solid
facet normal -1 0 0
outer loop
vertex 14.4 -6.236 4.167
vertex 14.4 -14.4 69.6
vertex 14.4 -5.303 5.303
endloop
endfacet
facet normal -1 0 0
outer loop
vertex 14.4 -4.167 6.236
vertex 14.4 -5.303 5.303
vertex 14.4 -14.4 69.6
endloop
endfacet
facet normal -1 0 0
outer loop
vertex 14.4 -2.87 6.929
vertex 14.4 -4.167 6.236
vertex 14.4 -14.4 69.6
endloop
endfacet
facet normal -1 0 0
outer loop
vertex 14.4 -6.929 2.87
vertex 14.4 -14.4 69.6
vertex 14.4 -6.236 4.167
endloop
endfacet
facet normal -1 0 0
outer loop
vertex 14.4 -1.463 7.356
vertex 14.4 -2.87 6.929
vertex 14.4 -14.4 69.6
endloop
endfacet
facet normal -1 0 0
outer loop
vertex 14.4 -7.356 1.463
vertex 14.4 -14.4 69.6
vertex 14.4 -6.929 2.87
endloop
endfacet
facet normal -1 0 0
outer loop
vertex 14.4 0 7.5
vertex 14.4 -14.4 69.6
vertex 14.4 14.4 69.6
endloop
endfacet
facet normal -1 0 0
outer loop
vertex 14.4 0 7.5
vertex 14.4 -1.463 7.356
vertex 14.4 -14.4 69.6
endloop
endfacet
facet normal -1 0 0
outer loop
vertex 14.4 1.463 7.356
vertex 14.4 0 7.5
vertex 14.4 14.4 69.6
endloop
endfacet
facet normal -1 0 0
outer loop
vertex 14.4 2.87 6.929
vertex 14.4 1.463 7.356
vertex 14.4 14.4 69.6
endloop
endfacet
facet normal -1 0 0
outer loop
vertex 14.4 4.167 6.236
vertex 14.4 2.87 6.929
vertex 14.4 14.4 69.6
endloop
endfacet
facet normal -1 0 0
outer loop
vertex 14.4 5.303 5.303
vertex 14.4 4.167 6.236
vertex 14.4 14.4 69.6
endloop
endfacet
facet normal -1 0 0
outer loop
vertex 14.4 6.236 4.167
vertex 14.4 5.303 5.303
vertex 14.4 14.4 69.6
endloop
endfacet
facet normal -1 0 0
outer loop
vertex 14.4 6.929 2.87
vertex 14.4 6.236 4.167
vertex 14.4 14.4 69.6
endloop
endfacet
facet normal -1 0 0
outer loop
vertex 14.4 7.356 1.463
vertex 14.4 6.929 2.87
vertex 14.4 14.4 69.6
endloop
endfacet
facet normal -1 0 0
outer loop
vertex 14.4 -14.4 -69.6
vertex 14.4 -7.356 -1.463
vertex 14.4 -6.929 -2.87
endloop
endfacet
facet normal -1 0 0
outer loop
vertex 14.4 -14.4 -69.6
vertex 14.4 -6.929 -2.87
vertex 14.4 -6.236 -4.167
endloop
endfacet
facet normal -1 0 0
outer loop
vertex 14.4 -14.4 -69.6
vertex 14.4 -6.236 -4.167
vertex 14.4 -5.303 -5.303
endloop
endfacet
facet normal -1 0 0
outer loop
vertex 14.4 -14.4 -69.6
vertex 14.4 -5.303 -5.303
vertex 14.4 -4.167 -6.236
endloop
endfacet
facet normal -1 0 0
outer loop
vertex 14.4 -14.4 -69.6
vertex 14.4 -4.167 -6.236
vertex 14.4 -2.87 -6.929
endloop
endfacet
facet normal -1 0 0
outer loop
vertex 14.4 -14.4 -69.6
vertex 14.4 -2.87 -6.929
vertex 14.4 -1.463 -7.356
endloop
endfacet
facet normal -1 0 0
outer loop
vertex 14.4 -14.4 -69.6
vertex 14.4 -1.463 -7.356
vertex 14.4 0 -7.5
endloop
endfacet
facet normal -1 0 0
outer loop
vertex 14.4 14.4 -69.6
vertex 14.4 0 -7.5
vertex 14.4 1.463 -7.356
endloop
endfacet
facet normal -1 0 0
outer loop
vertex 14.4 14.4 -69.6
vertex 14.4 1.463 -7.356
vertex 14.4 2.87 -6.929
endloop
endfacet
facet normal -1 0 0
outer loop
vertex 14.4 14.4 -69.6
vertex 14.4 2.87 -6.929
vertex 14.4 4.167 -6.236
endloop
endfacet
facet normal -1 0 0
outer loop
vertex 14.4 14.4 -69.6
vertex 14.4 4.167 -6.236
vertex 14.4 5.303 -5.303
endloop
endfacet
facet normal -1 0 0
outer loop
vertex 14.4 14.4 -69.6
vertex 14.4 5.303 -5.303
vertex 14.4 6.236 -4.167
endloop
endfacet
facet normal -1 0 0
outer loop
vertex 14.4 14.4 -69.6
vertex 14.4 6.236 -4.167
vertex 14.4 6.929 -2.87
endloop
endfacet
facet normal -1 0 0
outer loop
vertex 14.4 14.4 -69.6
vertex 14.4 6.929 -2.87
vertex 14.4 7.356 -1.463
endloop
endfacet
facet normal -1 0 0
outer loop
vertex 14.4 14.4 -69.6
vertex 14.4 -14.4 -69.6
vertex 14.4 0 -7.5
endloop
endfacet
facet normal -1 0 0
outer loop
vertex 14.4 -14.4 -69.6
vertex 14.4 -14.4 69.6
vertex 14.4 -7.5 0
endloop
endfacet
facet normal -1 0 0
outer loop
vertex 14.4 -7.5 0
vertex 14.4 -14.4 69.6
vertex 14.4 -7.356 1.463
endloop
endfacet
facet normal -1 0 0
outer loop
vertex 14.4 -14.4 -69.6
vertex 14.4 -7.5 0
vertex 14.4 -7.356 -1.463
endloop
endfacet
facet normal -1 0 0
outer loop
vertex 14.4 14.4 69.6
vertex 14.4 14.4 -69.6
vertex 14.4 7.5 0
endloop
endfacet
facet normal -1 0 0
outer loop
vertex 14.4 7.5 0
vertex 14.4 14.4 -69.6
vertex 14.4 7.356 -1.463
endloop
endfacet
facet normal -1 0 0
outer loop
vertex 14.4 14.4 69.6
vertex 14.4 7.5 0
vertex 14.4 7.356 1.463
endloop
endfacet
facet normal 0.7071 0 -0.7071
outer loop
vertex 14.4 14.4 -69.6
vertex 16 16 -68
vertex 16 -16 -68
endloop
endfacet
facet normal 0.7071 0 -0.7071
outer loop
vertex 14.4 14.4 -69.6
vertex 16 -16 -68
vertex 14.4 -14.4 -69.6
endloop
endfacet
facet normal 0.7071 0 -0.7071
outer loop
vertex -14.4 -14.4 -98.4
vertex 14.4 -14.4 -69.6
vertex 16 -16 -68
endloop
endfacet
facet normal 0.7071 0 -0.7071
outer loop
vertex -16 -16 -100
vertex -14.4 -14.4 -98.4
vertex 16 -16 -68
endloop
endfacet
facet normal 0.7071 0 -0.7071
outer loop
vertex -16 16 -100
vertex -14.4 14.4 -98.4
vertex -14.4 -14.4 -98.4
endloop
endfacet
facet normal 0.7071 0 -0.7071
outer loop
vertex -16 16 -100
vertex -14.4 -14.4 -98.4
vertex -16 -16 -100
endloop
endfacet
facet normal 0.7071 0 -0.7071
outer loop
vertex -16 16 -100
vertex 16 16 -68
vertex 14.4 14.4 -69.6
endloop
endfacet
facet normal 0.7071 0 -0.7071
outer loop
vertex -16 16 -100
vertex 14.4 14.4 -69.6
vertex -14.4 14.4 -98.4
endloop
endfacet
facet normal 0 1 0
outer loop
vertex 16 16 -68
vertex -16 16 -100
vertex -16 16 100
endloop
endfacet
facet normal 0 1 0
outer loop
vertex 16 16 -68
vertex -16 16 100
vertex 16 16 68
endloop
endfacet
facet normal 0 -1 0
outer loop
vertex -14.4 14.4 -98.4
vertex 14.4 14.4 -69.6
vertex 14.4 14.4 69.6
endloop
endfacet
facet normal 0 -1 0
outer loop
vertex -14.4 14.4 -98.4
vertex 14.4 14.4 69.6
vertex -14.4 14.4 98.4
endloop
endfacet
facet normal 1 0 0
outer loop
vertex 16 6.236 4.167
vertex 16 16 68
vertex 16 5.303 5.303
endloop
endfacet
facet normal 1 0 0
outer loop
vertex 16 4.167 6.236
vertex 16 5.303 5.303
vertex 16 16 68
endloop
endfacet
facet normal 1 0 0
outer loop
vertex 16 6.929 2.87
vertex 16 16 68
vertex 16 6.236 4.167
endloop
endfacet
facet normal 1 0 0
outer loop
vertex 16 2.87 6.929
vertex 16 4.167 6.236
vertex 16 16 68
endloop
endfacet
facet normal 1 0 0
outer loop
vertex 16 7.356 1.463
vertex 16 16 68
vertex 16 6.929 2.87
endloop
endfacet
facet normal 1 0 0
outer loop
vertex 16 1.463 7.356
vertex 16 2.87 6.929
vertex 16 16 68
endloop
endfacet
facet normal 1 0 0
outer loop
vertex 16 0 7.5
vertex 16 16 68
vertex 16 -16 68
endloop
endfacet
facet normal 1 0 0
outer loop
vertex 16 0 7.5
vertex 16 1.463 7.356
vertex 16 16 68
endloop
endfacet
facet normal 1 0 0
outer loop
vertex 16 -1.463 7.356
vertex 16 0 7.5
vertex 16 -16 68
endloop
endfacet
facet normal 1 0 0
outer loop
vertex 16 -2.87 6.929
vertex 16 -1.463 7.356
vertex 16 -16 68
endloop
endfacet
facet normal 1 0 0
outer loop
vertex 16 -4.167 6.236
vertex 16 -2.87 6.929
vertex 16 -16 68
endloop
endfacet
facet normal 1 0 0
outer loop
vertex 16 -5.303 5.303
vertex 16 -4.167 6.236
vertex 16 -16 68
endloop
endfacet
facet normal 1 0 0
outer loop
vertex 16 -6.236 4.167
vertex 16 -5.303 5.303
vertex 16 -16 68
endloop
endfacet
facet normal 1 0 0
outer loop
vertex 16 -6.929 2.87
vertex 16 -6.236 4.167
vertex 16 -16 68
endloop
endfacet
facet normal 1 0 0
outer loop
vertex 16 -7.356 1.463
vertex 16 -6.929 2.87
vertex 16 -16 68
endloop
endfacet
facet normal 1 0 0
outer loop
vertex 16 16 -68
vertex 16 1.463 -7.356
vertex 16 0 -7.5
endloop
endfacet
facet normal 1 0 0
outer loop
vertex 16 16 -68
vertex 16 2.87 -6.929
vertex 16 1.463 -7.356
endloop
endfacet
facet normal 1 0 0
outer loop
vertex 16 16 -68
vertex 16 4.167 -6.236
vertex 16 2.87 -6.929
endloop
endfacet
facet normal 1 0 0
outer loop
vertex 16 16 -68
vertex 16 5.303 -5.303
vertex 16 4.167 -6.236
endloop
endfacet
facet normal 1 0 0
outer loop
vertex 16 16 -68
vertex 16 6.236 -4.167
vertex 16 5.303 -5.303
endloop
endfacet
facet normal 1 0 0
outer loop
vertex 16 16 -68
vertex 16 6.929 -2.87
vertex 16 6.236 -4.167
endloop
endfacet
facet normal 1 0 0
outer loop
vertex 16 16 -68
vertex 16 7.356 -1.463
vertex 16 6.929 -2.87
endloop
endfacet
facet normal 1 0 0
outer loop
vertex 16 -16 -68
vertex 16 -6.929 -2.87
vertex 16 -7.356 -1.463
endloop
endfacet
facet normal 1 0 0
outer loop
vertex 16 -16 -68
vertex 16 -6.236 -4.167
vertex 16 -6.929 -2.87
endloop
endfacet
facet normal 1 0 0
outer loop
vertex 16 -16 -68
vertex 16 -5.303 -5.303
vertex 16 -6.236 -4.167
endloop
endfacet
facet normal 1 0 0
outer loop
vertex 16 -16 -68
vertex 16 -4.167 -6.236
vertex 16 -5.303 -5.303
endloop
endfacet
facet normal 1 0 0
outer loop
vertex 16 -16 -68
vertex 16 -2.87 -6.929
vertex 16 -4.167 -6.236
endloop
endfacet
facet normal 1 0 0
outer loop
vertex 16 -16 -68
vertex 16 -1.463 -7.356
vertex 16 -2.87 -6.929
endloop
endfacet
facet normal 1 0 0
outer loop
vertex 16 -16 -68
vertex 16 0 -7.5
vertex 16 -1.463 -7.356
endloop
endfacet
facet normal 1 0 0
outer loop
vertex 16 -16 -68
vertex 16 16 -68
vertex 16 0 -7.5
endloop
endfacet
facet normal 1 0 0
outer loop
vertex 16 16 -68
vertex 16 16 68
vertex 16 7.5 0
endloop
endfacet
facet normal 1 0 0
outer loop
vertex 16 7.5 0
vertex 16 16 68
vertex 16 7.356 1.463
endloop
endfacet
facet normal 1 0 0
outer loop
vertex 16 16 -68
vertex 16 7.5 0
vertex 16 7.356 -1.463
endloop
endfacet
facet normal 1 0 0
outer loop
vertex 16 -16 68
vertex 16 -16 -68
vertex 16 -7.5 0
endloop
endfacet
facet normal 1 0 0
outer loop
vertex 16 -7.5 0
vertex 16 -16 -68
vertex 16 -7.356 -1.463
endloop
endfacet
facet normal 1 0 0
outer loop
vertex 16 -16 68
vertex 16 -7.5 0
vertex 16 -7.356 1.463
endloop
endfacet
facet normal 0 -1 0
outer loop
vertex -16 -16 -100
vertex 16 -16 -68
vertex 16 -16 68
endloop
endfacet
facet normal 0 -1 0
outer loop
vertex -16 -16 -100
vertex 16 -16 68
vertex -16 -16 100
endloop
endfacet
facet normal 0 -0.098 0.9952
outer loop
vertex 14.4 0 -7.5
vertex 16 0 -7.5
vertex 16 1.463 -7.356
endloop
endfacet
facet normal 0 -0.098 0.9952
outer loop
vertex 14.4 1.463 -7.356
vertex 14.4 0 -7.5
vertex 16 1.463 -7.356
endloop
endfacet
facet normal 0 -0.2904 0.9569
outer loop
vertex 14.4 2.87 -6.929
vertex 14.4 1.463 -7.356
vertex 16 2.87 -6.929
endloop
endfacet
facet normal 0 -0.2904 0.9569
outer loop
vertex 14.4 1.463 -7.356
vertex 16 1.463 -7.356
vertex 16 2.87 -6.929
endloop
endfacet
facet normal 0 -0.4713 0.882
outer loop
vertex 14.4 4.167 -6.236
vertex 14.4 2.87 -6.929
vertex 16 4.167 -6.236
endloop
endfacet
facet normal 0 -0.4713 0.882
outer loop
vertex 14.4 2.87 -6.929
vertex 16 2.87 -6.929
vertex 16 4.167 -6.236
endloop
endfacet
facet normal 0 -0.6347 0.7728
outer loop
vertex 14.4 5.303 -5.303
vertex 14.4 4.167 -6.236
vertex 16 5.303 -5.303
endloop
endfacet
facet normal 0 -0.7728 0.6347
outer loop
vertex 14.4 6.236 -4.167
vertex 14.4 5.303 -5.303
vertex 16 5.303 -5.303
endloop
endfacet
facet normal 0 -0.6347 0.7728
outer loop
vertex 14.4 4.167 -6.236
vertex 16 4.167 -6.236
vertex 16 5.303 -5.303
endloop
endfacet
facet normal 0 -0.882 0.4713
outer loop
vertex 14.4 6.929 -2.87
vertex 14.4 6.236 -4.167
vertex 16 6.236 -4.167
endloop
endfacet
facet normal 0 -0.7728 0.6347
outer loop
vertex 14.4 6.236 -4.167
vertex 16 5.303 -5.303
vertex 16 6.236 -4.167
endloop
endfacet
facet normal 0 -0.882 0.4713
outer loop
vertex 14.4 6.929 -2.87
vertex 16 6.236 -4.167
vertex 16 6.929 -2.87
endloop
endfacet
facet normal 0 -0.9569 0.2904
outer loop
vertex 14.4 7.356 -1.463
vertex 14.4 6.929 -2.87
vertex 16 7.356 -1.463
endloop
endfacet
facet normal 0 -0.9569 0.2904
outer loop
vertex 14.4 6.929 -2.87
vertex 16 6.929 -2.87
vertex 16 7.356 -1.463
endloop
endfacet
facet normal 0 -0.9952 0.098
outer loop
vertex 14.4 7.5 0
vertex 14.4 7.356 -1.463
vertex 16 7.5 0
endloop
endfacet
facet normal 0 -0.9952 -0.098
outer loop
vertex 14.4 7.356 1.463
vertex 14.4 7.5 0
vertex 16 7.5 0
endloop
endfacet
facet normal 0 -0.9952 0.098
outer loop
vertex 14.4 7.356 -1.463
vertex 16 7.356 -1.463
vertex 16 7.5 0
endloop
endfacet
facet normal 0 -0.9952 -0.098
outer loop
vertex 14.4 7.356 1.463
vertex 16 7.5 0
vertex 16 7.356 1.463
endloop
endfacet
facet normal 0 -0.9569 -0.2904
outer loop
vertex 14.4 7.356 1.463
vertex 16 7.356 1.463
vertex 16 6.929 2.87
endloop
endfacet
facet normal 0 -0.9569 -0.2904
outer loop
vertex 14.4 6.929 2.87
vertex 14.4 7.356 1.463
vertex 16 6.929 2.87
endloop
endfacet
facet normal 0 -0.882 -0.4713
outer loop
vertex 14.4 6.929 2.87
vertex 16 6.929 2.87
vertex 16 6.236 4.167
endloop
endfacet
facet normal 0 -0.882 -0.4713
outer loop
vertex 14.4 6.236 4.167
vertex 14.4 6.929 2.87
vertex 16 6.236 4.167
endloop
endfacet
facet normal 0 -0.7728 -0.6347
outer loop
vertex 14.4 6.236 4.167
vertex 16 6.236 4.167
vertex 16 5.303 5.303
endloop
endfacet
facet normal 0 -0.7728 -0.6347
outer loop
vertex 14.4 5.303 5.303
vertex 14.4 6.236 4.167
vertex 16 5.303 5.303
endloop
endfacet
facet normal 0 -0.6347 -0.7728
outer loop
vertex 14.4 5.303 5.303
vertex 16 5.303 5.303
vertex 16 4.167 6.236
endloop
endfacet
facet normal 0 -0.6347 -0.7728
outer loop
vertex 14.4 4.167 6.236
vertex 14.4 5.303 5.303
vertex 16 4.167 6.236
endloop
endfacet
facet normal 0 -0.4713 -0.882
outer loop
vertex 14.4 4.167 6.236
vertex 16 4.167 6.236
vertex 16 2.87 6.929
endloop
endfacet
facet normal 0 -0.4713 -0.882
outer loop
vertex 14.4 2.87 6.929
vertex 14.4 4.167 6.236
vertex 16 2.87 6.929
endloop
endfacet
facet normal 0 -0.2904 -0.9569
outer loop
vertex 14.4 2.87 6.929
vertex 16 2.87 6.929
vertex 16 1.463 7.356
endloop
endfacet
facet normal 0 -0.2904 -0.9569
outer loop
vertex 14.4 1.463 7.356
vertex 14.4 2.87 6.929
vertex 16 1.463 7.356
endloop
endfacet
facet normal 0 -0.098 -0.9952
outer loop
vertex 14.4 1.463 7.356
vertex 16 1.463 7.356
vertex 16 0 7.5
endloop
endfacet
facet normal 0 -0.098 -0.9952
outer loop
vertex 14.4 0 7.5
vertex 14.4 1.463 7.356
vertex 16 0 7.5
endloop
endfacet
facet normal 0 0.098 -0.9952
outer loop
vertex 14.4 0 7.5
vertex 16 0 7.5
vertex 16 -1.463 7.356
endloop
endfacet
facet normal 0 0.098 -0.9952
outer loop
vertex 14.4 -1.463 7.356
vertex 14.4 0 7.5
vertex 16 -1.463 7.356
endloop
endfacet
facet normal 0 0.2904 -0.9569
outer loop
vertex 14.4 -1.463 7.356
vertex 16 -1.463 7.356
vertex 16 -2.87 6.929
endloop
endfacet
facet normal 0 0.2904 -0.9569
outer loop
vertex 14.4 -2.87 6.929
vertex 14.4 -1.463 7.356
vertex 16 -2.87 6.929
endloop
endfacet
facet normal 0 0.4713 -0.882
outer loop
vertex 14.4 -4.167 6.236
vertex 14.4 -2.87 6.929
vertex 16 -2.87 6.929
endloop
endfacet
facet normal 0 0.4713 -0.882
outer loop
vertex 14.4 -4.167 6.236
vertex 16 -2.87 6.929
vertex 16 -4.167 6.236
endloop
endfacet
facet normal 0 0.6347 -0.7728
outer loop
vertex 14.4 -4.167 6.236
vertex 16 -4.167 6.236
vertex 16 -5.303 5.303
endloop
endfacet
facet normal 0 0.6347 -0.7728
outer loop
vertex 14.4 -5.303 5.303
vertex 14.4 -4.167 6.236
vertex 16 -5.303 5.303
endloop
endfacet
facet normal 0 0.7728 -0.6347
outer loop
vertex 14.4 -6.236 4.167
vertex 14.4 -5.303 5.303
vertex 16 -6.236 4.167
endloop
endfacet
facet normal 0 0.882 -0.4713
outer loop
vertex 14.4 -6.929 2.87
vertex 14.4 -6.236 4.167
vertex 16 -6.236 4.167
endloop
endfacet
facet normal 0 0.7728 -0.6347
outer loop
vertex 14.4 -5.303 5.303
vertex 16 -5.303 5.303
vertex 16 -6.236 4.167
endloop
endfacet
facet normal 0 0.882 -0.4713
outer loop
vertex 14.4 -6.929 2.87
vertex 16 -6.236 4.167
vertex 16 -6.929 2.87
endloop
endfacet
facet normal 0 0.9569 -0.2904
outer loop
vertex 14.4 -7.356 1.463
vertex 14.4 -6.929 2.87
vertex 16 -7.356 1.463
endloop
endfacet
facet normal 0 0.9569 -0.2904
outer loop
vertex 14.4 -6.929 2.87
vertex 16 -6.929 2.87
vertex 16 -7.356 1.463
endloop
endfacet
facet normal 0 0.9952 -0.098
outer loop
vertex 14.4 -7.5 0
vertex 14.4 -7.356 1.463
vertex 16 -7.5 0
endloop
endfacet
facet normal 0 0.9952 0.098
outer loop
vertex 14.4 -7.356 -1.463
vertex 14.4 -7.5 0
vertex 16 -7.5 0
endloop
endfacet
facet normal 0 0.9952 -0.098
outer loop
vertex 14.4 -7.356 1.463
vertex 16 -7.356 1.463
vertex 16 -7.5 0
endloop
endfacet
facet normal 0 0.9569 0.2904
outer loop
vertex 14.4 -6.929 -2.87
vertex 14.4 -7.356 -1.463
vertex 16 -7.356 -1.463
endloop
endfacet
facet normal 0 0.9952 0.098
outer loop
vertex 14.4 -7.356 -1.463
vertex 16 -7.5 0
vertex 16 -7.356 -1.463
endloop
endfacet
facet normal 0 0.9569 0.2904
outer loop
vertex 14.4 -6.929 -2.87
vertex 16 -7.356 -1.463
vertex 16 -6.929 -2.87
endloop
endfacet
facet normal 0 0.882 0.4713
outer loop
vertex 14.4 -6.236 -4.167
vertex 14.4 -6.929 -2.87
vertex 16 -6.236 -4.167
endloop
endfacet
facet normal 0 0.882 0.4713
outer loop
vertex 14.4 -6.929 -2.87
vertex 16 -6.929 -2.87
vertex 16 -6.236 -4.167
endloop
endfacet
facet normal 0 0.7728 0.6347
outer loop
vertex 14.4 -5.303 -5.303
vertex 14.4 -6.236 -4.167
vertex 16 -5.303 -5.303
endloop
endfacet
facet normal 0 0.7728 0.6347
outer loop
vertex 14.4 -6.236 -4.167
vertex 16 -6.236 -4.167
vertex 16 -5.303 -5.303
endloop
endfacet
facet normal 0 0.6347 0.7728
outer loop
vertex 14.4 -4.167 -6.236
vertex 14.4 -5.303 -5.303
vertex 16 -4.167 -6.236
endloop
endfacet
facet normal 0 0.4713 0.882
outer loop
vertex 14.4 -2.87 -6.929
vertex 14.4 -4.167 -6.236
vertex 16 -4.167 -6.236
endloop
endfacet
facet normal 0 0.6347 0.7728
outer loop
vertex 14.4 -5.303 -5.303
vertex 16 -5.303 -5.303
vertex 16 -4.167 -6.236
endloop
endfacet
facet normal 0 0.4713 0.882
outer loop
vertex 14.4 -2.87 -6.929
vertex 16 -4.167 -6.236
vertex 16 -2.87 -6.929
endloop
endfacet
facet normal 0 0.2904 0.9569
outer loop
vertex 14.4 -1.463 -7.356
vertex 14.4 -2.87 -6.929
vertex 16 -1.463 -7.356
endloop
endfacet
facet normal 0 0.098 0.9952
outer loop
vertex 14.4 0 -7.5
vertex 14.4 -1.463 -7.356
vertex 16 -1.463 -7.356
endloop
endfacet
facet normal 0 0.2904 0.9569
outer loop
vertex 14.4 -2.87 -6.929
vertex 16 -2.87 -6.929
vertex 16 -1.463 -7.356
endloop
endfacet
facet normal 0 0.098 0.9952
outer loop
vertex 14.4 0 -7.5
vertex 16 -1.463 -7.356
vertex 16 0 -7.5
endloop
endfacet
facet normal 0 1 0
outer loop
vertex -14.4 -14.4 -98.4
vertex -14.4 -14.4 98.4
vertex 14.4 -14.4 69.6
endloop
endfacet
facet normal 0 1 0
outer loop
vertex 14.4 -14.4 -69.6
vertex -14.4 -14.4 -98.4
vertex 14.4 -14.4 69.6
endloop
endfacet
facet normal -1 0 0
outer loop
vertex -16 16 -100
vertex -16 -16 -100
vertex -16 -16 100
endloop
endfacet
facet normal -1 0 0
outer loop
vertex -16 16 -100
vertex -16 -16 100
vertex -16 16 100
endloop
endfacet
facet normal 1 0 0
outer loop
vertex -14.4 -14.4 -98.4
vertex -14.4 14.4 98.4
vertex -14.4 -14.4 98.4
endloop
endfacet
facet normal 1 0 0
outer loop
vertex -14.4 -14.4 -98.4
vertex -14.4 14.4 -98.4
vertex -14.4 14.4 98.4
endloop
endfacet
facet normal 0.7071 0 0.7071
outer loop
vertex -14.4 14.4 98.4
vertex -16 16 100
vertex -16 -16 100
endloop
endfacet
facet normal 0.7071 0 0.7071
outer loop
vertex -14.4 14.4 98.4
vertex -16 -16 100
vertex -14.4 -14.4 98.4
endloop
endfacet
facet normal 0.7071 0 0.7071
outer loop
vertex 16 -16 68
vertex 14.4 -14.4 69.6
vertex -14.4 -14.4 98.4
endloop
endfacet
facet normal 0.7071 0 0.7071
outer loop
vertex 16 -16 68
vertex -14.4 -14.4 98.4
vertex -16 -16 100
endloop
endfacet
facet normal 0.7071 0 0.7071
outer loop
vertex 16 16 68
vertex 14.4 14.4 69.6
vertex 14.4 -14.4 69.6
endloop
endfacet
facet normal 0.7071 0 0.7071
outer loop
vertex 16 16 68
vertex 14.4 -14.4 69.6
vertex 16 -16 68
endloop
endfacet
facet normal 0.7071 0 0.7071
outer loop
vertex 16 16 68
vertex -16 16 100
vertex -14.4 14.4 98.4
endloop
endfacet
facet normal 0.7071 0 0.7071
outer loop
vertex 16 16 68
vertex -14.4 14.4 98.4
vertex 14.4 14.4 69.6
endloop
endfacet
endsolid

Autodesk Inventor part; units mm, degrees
ref_plane "YZ Plane" through (0, 0, 0) normal (1, 0, 0) x (0, 1, 0)
ref_plane "XZ Plane" through (0, 0, 0) normal (0, 1, 0) x (-1, 0, 0)
ref_plane "XY Plane" through (0, 0, 0) normal (0, 0, 1) x (1, 0, 0)
sketch "スケッチ1" plane through (0, 0, 0) normal (0, 0, 1) x (1, 0, 0)
  line L0 (16, -16) -> (-16, -16)
  line L1 (-16, -16) -> (-16, 16)
  line L2 (-16, 16) -> (16, 16)
  line L3 (16, 16) -> (16, -16)
  line L4 (16, -16) -> (-16, 16) construction
  line L5 (-16, -16) -> (16, 16) construction
  line L6 (14.4, 14.4) -> (-14.4, 14.4)
  line L7 (-14.4, 14.4) -> (-14.4, -14.4)
  line L8 (-14.4, -14.4) -> (14.4, -14.4)
  line L9 (14.4, -14.4) -> (14.4, 14.4)
  point P0 (0, 0)
  dimension "d0" = 32
  dimension "d1" = 32
  dimension "d2" = 1.6
extrude "押し出し1" add sketch "スケッチ1" along normal mid plane 200
sketch "スケッチ3" plane through (16, -16, 100) normal (1, 0, 0) x (0, 0, -1)
  circle A0 centre (100, 16) radius 7.5
  dimension "d7" = 15
extrude "押し出し2" cut sketch "スケッチ3" against normal blind 30
chamfer "面取り2" distance 32 angle 45 1 edges at (16, 0, 100)
chamfer "面取り3" distance 32 angle 45 1 edges at (16, 0, -100)
properties part number "Pipe3"
